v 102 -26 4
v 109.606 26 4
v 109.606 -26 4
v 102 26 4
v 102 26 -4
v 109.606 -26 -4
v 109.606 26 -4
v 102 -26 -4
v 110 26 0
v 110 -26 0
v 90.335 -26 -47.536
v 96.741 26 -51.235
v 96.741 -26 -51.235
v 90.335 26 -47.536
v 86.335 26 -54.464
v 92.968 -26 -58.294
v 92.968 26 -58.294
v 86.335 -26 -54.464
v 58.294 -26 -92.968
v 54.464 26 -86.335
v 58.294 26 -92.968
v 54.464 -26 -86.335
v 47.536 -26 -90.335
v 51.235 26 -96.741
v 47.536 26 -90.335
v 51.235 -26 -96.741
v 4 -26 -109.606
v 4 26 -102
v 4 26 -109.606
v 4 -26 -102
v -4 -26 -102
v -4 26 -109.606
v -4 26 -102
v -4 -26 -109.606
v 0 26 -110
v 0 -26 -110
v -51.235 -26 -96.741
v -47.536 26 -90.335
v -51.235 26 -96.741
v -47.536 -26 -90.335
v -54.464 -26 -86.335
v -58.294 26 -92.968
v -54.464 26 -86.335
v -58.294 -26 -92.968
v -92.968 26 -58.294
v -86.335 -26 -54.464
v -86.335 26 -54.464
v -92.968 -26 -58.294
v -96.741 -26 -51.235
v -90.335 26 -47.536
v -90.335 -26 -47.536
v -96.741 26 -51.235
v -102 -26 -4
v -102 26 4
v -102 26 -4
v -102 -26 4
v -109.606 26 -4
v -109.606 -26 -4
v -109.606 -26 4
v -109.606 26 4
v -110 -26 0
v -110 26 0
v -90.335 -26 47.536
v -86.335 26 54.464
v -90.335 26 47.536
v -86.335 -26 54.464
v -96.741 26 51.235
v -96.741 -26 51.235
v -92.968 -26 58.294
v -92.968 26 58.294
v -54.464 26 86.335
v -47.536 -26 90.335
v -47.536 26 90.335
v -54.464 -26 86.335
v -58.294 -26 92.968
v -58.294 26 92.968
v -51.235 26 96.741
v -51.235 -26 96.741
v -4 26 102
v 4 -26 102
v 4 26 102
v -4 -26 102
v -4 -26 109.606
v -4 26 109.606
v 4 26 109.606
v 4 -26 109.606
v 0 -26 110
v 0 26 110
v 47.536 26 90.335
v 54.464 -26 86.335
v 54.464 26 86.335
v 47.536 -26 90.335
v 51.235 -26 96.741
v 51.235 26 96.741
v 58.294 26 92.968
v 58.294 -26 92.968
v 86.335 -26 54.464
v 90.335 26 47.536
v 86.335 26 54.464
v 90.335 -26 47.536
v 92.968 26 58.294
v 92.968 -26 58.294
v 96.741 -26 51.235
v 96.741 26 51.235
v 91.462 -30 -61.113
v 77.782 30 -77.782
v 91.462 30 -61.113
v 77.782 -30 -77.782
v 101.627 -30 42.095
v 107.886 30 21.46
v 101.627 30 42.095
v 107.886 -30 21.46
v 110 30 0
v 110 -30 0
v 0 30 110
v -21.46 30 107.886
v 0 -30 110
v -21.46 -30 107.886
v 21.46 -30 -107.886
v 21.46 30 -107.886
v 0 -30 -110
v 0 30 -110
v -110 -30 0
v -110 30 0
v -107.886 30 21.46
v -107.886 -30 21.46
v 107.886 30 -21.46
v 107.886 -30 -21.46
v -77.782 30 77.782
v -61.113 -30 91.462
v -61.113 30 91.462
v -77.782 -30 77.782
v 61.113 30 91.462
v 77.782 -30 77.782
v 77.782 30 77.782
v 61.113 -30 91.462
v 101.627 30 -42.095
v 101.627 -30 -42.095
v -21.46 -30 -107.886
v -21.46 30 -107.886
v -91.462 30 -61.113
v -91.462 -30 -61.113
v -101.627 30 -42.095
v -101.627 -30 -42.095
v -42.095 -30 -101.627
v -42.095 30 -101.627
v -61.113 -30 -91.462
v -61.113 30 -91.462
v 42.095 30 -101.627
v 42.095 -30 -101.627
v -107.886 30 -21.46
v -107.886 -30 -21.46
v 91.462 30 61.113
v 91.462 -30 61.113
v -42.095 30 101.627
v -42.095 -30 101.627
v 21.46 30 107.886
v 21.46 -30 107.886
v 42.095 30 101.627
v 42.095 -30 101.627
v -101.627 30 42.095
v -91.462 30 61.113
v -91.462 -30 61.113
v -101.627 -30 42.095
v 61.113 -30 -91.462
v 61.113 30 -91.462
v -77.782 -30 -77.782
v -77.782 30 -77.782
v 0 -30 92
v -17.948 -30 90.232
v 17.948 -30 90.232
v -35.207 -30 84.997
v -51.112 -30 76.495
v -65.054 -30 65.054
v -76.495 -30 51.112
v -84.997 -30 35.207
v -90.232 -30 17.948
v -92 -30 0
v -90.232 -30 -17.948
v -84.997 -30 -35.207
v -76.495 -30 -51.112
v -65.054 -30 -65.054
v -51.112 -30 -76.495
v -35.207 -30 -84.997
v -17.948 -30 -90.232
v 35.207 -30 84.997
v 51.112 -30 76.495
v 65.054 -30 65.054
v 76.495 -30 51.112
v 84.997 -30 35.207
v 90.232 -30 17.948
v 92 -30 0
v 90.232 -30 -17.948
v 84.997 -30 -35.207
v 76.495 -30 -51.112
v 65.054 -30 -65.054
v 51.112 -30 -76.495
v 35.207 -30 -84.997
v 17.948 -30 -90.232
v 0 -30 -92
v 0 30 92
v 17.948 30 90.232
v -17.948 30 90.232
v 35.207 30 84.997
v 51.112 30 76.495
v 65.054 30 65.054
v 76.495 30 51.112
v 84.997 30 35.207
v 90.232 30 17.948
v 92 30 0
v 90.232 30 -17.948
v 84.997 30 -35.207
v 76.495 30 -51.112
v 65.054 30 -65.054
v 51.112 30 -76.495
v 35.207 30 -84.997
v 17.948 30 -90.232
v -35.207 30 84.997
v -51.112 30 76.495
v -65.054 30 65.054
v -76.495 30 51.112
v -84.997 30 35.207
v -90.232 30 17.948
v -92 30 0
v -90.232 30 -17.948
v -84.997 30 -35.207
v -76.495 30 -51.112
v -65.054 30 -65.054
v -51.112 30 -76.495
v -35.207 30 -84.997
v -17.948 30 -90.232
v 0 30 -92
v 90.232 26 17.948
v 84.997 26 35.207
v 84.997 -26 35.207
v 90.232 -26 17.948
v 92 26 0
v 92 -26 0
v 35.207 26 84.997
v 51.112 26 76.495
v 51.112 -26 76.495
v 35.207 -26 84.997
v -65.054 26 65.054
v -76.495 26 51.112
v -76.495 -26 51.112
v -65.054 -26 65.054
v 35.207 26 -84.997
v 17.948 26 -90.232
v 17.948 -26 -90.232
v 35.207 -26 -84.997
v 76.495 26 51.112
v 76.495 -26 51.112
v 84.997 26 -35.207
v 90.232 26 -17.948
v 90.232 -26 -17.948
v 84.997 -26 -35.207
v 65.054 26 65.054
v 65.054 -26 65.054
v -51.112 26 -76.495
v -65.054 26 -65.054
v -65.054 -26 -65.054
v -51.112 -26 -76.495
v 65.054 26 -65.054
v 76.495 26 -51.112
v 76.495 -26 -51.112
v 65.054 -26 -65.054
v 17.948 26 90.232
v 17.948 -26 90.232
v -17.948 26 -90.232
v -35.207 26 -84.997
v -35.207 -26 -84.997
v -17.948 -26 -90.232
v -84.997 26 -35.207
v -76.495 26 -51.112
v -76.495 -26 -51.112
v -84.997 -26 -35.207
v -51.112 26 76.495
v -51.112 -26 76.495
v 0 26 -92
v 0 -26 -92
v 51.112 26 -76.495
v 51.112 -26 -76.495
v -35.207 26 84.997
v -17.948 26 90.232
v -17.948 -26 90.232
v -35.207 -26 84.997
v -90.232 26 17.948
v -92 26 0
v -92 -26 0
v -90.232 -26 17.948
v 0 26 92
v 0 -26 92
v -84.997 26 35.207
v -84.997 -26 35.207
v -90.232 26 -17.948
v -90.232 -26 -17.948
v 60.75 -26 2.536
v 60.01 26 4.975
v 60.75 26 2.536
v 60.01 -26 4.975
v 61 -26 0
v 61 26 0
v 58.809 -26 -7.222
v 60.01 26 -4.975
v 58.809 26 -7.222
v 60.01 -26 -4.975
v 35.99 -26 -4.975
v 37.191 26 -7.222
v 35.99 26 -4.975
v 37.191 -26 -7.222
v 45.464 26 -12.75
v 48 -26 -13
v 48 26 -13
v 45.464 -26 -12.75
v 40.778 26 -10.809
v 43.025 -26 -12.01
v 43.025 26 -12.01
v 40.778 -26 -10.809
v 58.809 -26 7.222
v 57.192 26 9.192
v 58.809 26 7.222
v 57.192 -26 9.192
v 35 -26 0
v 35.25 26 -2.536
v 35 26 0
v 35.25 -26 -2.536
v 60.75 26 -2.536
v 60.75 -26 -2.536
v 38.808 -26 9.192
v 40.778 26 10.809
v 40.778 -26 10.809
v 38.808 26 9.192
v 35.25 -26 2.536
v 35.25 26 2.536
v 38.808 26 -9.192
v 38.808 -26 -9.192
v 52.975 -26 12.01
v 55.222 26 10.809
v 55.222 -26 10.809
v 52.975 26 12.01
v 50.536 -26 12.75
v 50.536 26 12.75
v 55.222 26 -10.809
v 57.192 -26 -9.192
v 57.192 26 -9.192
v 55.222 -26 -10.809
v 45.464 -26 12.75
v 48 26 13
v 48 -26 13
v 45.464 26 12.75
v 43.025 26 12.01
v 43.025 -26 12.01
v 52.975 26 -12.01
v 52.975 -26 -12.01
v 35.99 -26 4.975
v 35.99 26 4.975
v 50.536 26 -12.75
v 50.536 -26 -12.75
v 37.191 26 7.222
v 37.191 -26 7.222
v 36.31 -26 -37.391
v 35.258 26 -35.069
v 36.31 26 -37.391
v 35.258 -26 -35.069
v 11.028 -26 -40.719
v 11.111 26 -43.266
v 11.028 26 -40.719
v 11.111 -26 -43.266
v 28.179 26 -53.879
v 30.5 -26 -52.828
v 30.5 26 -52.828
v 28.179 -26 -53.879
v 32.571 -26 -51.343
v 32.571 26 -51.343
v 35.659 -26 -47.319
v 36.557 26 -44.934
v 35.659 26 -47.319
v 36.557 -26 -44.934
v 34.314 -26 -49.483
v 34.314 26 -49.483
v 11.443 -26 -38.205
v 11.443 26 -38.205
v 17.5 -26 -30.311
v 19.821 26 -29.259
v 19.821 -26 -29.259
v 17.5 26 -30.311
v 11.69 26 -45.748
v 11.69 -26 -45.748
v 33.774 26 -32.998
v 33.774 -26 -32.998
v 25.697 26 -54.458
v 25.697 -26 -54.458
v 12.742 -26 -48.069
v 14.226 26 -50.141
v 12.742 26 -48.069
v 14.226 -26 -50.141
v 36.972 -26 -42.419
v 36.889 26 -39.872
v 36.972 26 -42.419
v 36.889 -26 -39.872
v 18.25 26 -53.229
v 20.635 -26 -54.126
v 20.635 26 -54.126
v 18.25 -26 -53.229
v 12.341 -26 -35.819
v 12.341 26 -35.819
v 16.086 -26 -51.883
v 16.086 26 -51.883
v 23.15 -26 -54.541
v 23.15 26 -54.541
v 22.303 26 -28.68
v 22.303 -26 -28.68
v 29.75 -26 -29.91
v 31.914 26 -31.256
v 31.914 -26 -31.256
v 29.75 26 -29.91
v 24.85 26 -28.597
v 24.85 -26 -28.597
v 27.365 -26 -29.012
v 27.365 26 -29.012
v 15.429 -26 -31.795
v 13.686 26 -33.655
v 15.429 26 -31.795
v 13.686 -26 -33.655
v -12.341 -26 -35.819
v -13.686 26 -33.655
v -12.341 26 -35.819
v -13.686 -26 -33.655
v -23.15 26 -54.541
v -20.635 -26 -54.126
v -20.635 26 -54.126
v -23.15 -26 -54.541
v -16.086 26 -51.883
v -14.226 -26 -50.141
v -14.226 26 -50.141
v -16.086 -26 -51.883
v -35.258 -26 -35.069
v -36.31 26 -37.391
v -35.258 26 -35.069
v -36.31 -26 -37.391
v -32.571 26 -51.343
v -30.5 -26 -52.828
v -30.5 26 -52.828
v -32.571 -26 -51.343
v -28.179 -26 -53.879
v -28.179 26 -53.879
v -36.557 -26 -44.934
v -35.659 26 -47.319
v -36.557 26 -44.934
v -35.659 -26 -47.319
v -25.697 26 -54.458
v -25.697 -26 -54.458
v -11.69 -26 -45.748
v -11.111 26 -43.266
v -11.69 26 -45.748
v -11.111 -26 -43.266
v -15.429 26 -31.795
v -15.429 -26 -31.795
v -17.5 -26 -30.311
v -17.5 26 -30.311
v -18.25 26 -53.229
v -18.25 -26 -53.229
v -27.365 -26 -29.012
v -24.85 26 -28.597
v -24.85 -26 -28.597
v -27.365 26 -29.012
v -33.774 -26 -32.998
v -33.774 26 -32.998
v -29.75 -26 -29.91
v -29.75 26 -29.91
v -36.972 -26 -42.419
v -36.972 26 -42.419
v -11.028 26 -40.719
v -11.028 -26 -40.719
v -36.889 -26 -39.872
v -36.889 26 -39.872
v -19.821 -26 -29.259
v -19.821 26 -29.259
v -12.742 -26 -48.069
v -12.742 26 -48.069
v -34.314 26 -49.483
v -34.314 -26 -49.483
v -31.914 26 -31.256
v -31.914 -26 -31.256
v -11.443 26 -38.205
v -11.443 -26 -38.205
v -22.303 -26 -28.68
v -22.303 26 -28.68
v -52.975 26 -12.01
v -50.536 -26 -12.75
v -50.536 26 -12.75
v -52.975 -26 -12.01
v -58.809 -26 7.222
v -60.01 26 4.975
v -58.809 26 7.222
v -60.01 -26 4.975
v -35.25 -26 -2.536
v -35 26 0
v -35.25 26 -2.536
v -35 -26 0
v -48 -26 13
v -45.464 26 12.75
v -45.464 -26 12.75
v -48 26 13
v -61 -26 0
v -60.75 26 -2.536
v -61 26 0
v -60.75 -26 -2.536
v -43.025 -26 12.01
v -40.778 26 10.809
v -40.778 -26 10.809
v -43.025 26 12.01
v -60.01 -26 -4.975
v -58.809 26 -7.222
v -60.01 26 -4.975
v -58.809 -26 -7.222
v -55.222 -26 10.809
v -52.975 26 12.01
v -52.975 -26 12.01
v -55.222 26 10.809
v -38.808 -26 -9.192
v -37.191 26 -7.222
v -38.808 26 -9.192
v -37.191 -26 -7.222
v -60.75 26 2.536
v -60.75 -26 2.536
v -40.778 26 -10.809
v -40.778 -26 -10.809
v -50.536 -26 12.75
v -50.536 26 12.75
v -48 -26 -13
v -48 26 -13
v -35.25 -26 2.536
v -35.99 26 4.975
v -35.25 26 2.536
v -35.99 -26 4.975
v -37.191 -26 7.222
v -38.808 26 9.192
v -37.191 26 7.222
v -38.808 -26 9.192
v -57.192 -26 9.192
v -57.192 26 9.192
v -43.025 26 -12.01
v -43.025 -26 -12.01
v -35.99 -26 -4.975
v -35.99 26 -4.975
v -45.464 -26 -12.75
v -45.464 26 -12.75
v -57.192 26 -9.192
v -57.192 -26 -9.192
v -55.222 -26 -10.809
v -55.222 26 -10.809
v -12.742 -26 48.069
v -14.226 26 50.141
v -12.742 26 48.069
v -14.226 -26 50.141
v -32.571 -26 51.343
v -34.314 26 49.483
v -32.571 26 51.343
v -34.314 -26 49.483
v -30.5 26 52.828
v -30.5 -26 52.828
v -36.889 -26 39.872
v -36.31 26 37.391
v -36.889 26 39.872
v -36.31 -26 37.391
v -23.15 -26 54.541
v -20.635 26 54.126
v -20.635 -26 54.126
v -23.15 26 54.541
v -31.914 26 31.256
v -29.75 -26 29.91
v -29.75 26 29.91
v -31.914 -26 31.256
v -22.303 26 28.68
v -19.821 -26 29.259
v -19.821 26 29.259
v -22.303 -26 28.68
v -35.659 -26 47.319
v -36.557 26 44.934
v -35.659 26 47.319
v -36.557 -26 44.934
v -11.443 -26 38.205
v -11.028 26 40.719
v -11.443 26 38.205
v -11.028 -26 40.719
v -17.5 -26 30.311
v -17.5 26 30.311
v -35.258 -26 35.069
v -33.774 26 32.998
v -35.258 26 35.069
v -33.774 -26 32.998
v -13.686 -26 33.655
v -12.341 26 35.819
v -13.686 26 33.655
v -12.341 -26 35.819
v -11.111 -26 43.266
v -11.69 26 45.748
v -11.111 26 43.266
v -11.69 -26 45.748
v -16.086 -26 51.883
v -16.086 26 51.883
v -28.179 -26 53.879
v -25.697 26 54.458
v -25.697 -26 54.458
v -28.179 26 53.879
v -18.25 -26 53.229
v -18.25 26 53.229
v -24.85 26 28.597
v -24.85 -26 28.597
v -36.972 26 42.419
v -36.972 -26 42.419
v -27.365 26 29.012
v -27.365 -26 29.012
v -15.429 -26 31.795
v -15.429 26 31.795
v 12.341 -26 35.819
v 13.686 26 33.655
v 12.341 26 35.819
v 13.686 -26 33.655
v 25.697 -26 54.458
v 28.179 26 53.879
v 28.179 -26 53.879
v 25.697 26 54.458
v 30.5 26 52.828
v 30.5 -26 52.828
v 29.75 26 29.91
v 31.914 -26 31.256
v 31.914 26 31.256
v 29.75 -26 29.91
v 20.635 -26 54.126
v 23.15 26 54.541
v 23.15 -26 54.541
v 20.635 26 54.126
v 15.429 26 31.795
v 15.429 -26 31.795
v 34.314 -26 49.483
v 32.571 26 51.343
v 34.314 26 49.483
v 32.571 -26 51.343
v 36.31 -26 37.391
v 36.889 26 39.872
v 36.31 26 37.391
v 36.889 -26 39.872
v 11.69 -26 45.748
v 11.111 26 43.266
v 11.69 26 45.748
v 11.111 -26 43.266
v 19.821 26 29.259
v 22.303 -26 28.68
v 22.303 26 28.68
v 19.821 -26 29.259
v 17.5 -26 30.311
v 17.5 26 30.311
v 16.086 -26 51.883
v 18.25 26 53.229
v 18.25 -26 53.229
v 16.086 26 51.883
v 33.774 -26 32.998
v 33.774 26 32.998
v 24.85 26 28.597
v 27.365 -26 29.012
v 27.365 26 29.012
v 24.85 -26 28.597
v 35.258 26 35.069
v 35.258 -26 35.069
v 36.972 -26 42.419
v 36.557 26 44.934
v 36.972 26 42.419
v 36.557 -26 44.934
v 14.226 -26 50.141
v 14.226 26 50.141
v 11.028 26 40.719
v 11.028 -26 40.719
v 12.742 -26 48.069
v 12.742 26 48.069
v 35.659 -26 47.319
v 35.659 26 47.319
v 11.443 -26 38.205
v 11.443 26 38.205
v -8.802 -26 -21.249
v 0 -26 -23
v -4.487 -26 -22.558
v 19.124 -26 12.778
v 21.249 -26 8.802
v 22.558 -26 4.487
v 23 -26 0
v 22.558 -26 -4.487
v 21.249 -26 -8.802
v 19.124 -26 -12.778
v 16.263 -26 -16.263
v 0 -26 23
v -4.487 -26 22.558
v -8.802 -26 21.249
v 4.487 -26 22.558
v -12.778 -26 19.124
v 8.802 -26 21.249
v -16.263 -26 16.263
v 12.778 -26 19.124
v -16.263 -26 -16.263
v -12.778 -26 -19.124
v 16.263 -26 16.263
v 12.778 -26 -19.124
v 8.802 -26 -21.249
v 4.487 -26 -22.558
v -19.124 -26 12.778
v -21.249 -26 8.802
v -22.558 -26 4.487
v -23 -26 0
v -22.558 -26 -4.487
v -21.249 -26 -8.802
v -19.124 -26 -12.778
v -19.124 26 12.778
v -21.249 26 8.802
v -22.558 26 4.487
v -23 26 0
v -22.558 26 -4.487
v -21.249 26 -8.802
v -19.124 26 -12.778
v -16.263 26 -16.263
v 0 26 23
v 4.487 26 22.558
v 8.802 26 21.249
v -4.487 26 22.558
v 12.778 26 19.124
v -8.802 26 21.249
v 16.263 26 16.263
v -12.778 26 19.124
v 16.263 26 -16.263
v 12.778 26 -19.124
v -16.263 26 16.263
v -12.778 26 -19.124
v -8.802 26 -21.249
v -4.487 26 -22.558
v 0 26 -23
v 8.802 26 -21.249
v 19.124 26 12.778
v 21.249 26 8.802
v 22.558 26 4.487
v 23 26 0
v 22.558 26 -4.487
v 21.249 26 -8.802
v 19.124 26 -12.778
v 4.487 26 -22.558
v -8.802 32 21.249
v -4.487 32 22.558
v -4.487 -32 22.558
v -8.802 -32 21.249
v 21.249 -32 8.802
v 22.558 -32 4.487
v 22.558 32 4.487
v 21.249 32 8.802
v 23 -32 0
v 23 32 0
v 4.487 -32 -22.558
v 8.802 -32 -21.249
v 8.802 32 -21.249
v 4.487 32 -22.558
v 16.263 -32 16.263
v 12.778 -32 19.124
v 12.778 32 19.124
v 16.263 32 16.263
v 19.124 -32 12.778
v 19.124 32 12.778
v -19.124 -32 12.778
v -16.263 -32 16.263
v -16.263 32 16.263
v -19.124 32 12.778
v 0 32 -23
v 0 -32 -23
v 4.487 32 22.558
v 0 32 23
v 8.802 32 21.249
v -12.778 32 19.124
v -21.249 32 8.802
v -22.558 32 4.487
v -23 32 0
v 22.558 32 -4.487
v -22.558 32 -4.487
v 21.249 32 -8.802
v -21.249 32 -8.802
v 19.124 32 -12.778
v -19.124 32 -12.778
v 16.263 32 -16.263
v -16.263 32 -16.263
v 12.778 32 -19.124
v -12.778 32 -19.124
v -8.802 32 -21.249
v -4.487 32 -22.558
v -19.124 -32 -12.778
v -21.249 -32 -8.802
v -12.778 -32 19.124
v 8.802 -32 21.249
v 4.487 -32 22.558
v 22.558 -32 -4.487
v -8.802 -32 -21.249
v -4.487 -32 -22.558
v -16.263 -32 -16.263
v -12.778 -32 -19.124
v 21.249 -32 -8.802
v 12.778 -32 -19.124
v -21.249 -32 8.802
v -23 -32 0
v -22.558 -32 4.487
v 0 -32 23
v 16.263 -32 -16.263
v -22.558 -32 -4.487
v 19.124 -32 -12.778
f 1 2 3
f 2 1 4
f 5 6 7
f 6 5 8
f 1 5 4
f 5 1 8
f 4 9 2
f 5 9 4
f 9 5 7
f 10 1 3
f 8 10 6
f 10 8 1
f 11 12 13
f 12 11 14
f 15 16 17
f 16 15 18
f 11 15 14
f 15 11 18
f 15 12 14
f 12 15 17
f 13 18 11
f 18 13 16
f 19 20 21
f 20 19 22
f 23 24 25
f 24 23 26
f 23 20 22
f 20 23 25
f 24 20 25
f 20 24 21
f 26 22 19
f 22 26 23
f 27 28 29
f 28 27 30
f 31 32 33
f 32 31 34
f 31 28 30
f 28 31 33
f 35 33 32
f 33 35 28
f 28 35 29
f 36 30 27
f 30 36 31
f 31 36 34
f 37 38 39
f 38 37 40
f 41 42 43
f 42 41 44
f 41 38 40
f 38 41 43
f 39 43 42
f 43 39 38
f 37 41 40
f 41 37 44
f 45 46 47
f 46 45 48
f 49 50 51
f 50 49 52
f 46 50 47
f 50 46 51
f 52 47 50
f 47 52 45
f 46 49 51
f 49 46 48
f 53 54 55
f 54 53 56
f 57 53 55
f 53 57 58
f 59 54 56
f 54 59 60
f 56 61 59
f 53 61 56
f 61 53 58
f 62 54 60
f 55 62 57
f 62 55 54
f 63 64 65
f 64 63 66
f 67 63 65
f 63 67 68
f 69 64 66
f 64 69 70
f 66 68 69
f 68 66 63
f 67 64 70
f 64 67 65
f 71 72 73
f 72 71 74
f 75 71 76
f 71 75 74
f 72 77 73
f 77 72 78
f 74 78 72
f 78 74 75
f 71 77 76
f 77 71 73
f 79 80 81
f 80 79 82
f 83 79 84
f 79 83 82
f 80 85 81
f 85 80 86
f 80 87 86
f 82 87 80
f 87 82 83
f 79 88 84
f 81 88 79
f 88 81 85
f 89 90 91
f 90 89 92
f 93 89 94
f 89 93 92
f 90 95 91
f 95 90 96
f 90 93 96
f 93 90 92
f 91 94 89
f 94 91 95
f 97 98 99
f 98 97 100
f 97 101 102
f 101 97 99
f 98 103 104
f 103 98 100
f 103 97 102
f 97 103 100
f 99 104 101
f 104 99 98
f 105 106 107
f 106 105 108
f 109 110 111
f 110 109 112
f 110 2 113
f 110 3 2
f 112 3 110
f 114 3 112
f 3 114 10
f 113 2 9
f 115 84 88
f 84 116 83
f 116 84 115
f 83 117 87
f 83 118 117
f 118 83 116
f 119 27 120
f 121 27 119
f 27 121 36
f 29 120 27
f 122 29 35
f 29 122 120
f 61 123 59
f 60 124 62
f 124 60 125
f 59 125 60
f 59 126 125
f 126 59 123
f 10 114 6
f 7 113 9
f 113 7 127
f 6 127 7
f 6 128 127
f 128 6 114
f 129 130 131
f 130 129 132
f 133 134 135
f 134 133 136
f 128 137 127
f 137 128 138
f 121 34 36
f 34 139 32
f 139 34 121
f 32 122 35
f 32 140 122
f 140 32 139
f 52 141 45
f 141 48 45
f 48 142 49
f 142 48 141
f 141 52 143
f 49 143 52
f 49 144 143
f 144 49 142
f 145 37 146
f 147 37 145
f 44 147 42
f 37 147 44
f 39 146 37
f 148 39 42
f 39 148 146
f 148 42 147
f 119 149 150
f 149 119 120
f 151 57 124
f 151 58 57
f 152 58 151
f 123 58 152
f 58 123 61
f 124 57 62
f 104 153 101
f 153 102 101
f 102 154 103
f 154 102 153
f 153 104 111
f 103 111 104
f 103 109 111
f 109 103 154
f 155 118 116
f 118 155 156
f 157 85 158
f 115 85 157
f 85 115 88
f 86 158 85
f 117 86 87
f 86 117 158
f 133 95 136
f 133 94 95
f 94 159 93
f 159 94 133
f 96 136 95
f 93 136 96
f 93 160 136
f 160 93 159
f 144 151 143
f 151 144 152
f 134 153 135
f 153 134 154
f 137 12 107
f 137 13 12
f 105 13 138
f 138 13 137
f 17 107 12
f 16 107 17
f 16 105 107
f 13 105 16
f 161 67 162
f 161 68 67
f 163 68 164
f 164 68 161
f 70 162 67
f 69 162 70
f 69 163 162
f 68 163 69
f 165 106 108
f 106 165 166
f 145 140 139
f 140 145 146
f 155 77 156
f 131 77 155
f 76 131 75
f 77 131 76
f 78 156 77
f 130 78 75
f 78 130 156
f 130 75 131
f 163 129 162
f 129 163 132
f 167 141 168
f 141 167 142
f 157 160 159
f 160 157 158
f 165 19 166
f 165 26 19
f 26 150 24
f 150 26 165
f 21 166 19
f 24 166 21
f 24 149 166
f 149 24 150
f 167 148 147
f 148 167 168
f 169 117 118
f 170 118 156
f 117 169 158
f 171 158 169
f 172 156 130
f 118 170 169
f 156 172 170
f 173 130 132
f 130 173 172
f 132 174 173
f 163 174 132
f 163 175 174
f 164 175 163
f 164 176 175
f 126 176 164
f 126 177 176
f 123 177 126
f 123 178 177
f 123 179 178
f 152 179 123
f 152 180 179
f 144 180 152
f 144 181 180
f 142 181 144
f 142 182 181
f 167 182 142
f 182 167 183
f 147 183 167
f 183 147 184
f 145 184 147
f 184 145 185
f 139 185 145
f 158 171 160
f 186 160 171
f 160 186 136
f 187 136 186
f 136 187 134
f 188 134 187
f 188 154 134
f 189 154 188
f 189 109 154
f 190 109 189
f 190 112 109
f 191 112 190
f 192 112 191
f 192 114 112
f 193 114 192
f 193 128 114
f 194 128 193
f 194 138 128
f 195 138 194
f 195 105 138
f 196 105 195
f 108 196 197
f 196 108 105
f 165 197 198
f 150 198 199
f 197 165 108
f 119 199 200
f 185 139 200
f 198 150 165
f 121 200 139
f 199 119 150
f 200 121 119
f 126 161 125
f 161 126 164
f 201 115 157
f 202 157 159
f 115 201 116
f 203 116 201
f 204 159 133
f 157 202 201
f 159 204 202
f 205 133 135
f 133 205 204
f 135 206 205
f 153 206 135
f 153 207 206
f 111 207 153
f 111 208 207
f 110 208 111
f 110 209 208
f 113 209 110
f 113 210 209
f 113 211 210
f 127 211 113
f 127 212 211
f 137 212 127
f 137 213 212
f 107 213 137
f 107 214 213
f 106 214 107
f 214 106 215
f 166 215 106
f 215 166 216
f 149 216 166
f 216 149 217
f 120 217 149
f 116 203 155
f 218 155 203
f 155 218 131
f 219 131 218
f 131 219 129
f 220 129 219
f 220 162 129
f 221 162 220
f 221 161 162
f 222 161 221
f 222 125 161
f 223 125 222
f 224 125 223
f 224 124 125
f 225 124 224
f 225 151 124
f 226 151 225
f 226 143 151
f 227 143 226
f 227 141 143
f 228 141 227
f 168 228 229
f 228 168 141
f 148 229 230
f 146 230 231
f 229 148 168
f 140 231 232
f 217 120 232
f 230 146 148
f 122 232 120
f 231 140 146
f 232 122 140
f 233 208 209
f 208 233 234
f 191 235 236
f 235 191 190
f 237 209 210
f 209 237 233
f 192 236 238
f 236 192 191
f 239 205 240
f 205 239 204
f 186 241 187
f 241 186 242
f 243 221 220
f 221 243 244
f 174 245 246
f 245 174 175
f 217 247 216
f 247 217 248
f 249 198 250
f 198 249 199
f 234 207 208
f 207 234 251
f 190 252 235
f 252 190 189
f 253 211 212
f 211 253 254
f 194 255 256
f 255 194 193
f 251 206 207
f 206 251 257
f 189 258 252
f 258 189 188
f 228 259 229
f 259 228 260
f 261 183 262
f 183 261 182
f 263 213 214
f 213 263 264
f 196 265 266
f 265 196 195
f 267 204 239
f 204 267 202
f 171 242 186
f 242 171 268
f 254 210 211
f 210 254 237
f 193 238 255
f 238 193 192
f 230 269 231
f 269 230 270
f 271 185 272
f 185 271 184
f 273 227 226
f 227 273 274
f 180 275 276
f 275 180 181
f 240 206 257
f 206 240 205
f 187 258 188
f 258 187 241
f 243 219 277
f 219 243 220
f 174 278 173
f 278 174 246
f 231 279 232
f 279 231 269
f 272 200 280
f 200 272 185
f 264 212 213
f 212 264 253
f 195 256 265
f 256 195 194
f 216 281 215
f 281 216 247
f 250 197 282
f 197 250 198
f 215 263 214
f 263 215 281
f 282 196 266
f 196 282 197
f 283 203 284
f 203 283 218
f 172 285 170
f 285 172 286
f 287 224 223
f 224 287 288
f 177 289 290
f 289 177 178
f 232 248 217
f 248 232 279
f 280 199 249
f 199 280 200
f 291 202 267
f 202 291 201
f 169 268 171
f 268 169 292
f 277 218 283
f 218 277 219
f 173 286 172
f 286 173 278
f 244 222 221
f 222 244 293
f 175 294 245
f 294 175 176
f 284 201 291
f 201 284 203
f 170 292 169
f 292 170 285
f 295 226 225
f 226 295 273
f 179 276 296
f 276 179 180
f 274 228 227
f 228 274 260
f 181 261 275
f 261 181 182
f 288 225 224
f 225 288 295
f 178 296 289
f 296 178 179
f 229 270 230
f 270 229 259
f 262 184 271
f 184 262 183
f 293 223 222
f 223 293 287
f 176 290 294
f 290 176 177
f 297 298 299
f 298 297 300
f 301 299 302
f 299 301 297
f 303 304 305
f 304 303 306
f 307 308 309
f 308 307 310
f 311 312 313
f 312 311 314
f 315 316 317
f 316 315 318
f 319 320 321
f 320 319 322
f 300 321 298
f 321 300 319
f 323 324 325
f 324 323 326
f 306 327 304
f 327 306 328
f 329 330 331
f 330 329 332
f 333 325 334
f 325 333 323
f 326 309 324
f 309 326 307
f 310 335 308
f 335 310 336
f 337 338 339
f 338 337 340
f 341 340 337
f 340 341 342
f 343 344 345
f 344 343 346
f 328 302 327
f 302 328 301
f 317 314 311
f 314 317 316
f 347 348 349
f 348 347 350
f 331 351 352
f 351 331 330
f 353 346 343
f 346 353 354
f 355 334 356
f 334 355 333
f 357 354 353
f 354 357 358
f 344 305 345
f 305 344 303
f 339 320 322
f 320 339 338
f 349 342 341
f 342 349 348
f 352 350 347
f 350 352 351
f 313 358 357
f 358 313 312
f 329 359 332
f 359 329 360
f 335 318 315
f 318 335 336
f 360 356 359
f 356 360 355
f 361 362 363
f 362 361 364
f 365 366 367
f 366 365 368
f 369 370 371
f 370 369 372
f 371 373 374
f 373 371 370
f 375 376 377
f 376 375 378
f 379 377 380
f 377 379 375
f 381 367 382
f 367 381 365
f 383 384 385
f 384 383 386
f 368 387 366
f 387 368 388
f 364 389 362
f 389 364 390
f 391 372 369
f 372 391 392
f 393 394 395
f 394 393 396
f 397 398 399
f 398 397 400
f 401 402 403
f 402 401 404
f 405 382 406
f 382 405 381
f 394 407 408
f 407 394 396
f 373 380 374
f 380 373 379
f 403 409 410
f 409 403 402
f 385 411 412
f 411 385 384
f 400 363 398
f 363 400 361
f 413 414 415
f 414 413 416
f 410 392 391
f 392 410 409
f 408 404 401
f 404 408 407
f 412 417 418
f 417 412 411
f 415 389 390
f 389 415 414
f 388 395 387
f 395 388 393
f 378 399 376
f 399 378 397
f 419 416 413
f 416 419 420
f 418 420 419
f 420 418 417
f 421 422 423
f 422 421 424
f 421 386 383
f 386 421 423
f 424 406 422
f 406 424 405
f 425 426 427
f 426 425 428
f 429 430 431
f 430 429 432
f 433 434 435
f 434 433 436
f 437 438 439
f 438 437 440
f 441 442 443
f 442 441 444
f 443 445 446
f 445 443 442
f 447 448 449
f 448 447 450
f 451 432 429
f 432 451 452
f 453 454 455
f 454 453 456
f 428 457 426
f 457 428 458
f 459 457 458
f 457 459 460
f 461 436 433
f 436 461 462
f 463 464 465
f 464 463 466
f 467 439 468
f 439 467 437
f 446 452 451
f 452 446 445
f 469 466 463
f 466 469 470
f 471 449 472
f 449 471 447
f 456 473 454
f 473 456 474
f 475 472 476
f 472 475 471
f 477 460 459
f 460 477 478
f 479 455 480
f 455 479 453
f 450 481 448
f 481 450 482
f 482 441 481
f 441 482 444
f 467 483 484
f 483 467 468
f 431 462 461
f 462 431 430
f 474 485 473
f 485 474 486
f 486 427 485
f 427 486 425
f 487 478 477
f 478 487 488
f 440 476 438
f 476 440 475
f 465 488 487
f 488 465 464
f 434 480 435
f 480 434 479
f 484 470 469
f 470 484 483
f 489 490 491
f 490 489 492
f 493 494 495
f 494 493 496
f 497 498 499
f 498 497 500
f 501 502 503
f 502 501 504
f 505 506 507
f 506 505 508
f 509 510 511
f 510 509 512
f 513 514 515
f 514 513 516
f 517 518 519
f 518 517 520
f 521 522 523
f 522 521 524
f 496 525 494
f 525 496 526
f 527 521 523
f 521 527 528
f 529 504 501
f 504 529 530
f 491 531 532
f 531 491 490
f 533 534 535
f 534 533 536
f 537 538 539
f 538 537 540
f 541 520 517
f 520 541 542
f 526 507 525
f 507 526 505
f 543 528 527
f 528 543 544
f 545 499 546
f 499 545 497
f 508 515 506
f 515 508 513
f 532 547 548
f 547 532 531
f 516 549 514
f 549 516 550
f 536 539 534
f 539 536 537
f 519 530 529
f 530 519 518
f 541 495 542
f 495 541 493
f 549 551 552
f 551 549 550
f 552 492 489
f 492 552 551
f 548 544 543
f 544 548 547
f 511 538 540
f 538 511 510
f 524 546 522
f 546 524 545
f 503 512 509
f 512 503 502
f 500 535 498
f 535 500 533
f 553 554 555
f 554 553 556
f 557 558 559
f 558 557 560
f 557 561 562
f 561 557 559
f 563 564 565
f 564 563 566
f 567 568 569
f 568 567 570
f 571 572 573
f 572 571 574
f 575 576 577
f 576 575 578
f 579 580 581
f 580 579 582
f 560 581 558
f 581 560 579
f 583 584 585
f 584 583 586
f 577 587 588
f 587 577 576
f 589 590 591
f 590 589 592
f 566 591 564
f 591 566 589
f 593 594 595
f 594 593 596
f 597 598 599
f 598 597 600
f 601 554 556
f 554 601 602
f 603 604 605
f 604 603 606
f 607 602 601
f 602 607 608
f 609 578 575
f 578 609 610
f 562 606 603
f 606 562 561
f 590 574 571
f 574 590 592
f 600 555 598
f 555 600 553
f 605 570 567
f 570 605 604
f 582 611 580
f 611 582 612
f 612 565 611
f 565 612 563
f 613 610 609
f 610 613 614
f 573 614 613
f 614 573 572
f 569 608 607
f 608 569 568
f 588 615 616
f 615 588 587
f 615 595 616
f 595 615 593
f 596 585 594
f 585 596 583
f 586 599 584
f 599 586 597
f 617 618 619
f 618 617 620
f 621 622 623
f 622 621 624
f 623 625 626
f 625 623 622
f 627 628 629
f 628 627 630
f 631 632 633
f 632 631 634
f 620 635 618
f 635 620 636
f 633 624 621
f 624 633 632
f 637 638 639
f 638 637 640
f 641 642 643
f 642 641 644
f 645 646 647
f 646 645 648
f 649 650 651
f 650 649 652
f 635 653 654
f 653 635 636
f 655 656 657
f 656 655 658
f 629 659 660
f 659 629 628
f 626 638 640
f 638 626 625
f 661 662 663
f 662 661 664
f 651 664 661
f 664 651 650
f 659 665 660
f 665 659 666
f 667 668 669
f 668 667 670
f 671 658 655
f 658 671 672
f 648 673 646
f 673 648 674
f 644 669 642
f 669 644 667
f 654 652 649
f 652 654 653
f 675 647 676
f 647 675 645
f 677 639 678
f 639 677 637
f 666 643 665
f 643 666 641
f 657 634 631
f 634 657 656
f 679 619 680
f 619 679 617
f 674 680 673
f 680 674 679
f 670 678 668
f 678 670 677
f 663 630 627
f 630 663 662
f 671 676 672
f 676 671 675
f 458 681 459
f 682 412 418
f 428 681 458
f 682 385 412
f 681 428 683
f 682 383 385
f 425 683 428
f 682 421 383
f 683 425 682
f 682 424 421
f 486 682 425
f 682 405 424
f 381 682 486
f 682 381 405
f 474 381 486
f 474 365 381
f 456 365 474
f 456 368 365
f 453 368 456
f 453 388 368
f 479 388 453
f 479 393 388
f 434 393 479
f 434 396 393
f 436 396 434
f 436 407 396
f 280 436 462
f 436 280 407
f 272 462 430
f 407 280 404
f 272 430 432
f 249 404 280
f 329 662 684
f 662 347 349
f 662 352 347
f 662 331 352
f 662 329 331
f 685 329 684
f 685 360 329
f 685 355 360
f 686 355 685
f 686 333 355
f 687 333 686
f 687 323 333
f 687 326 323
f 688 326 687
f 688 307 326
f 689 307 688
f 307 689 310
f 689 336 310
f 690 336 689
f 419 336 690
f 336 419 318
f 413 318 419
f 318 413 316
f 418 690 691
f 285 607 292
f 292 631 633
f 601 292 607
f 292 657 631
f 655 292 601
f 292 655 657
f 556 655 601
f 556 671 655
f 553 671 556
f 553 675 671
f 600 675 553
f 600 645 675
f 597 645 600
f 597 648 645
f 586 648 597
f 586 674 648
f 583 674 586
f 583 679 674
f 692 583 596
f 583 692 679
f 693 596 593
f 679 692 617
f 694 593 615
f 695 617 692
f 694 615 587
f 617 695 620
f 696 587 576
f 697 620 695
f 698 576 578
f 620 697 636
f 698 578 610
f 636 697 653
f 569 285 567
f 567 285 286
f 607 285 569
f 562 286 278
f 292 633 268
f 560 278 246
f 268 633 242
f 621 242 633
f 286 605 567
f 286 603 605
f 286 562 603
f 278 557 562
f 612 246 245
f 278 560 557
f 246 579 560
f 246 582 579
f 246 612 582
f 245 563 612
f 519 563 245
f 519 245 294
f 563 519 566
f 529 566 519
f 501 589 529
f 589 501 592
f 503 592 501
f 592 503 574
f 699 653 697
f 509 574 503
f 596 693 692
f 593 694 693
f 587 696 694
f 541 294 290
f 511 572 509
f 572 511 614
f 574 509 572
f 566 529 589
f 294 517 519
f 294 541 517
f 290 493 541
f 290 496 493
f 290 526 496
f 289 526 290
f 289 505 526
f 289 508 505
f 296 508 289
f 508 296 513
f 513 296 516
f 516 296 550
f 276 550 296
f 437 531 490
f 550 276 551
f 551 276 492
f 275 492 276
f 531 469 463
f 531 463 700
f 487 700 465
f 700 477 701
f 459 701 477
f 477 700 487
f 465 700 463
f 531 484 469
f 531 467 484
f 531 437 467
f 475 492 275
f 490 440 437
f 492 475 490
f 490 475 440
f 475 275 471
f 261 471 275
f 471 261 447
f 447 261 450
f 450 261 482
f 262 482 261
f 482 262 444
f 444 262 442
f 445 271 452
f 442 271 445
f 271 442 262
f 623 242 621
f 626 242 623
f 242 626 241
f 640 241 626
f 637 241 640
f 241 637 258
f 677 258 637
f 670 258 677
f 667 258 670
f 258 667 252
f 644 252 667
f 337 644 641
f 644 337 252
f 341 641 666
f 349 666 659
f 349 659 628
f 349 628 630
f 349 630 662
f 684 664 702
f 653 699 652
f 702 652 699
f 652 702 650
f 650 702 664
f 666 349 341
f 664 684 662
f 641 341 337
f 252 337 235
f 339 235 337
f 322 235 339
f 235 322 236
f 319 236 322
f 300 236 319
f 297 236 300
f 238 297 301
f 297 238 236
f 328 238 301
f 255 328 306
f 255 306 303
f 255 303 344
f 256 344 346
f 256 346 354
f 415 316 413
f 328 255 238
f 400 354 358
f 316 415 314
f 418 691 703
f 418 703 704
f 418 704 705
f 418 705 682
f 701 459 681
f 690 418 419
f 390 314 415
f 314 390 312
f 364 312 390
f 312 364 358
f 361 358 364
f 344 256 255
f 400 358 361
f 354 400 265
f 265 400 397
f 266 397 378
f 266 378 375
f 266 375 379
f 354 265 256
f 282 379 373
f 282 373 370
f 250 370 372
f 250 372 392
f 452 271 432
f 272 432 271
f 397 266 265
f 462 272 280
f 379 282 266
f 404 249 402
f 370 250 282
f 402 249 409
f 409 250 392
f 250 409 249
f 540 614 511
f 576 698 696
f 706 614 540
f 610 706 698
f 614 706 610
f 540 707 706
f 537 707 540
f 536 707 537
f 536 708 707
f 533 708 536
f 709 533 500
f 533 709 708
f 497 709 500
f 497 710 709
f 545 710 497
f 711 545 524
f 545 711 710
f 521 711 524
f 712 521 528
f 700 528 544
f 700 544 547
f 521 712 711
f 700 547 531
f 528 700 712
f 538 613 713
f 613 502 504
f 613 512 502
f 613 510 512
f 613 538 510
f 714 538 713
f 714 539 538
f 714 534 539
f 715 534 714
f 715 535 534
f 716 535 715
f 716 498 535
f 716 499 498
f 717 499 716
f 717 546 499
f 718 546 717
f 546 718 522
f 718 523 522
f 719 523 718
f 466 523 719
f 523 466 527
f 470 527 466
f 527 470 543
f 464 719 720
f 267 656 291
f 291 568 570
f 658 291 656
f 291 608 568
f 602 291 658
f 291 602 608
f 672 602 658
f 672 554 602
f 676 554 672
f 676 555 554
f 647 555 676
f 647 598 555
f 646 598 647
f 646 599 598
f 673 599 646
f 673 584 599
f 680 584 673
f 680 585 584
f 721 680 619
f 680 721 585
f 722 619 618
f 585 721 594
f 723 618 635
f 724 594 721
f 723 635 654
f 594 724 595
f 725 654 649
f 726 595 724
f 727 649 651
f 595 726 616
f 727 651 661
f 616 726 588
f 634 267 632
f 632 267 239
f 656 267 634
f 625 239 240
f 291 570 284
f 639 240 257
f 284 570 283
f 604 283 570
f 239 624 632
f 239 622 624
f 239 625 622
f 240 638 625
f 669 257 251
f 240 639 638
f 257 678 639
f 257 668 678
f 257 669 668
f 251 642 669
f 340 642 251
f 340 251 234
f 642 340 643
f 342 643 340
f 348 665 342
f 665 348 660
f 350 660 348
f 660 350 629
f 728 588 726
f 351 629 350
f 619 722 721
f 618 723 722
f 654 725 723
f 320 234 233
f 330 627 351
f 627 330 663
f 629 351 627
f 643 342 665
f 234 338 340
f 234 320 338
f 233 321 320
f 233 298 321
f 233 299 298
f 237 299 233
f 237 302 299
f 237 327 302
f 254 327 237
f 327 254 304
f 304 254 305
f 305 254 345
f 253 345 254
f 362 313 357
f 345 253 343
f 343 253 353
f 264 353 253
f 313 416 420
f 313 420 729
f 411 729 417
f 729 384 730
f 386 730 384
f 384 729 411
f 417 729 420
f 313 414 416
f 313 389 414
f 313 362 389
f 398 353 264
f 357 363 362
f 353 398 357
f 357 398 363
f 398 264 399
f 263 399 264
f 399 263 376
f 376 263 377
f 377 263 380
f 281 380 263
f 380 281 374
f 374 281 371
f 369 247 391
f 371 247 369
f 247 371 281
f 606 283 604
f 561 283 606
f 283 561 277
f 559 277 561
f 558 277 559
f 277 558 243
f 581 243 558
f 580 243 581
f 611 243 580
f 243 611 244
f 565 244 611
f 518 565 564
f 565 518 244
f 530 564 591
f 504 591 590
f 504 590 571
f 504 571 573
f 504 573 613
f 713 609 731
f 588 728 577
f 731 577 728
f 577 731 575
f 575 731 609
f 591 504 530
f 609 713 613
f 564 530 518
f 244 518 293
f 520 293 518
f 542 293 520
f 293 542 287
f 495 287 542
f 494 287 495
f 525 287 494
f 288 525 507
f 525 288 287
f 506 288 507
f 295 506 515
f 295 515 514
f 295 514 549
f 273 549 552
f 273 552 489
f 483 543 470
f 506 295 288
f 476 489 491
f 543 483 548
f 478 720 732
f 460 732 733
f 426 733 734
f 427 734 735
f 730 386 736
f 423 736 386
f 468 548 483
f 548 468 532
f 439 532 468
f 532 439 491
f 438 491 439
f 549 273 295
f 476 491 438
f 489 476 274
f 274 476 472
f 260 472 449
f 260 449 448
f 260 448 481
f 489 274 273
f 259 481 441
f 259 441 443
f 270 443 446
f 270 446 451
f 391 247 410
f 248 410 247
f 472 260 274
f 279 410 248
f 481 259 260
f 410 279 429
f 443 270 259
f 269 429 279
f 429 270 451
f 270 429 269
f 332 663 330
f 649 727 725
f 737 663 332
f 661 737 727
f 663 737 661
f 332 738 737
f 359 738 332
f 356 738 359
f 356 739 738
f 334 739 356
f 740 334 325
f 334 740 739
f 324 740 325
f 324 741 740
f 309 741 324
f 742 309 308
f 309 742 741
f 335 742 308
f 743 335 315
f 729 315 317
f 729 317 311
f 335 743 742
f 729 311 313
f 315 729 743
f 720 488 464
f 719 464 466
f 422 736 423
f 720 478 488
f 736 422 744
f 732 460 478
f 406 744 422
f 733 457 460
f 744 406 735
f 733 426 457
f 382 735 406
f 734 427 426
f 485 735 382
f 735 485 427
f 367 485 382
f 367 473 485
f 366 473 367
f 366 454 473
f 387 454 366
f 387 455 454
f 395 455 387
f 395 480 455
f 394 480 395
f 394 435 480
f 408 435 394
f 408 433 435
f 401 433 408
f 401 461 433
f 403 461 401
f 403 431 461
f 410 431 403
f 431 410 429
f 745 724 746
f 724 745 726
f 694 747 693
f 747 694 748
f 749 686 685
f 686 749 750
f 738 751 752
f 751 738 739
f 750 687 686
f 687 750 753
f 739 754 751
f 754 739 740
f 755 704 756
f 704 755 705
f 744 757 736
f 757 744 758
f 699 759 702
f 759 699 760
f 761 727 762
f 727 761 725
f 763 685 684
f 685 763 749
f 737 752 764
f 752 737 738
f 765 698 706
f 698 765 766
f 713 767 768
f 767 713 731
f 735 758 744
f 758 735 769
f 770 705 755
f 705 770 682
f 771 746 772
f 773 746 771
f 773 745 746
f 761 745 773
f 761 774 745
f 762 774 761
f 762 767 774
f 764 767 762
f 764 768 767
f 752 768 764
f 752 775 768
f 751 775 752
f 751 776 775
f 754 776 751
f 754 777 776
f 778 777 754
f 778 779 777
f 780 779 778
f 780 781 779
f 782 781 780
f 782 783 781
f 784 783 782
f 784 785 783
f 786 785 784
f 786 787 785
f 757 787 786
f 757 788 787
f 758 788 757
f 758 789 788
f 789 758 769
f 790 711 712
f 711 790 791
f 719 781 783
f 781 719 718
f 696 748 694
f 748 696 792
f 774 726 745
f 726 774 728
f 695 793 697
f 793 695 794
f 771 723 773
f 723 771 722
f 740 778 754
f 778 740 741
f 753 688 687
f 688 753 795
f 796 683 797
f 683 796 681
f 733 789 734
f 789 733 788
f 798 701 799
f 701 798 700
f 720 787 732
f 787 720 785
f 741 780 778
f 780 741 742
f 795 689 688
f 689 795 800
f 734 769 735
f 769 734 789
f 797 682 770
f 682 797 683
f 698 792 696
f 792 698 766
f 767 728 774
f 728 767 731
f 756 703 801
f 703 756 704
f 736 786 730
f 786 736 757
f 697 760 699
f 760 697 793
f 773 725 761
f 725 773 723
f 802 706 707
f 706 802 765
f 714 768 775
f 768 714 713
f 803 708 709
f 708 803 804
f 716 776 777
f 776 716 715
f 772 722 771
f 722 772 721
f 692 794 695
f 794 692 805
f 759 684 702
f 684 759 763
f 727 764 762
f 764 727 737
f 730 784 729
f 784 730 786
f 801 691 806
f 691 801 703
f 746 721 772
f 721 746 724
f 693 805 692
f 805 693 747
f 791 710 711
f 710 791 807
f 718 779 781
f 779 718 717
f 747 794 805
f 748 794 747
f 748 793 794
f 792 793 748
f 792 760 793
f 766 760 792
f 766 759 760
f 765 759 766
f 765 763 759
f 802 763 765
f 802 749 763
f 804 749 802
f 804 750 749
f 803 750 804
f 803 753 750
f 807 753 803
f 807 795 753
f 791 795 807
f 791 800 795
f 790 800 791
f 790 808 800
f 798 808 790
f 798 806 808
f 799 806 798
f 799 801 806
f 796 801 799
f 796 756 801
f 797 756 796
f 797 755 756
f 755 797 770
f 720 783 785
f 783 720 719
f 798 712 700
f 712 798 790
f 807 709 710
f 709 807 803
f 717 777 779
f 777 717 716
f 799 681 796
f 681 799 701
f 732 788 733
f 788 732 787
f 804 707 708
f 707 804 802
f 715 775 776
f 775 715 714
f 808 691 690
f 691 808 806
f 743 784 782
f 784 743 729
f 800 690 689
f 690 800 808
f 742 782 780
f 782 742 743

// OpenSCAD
// ============================================================================
// FILE: export_right_wheel.scad
// OUTPUT: right_wheel_visual.stl
// PURPOSE: Export only the right main drive wheel.
// ============================================================================

// Chi nap module va function.
// Khong chay factory_scene() trong main.scad.
use <main.scad>


// ============================================================================
// REQUIRED PARAMETERS
// Units: millimeters
// ============================================================================

eps = 0.05;

quality = "render";
preview_fn = 32;
render_fn  = 72;

$fn = quality == "render"
    ? render_fn
    : preview_fn;


// Main drive-wheel dimensions
drive_wheel_diameter = 220;
drive_wheel_radius   = drive_wheel_diameter / 2;
drive_wheel_width    = 60;

// Distance between left and right wheel centerlines
drive_wheel_track = 620;

// Wheel axle height above the ground
drive_wheel_axle_z = drive_wheel_radius;

// Disable labels
show_component_labels = false;


// ============================================================================
// RIGHT WHEEL EXPORT
// ============================================================================
//
// Original right-wheel center:
//
// X = 0 mm
// Y = -310 mm
// Z = 110 mm
//
// Move the wheel axle center to STL origin [0, 0, 0].
//
// URDF joint:
// origin xyz="0 -0.310 0.110"
// axis xyz="0 1 0"
// ============================================================================

translate([
    0,
    drive_wheel_track / 2,
    -drive_wheel_axle_z
])
    drive_wheel(
        -1,
        0
    );
